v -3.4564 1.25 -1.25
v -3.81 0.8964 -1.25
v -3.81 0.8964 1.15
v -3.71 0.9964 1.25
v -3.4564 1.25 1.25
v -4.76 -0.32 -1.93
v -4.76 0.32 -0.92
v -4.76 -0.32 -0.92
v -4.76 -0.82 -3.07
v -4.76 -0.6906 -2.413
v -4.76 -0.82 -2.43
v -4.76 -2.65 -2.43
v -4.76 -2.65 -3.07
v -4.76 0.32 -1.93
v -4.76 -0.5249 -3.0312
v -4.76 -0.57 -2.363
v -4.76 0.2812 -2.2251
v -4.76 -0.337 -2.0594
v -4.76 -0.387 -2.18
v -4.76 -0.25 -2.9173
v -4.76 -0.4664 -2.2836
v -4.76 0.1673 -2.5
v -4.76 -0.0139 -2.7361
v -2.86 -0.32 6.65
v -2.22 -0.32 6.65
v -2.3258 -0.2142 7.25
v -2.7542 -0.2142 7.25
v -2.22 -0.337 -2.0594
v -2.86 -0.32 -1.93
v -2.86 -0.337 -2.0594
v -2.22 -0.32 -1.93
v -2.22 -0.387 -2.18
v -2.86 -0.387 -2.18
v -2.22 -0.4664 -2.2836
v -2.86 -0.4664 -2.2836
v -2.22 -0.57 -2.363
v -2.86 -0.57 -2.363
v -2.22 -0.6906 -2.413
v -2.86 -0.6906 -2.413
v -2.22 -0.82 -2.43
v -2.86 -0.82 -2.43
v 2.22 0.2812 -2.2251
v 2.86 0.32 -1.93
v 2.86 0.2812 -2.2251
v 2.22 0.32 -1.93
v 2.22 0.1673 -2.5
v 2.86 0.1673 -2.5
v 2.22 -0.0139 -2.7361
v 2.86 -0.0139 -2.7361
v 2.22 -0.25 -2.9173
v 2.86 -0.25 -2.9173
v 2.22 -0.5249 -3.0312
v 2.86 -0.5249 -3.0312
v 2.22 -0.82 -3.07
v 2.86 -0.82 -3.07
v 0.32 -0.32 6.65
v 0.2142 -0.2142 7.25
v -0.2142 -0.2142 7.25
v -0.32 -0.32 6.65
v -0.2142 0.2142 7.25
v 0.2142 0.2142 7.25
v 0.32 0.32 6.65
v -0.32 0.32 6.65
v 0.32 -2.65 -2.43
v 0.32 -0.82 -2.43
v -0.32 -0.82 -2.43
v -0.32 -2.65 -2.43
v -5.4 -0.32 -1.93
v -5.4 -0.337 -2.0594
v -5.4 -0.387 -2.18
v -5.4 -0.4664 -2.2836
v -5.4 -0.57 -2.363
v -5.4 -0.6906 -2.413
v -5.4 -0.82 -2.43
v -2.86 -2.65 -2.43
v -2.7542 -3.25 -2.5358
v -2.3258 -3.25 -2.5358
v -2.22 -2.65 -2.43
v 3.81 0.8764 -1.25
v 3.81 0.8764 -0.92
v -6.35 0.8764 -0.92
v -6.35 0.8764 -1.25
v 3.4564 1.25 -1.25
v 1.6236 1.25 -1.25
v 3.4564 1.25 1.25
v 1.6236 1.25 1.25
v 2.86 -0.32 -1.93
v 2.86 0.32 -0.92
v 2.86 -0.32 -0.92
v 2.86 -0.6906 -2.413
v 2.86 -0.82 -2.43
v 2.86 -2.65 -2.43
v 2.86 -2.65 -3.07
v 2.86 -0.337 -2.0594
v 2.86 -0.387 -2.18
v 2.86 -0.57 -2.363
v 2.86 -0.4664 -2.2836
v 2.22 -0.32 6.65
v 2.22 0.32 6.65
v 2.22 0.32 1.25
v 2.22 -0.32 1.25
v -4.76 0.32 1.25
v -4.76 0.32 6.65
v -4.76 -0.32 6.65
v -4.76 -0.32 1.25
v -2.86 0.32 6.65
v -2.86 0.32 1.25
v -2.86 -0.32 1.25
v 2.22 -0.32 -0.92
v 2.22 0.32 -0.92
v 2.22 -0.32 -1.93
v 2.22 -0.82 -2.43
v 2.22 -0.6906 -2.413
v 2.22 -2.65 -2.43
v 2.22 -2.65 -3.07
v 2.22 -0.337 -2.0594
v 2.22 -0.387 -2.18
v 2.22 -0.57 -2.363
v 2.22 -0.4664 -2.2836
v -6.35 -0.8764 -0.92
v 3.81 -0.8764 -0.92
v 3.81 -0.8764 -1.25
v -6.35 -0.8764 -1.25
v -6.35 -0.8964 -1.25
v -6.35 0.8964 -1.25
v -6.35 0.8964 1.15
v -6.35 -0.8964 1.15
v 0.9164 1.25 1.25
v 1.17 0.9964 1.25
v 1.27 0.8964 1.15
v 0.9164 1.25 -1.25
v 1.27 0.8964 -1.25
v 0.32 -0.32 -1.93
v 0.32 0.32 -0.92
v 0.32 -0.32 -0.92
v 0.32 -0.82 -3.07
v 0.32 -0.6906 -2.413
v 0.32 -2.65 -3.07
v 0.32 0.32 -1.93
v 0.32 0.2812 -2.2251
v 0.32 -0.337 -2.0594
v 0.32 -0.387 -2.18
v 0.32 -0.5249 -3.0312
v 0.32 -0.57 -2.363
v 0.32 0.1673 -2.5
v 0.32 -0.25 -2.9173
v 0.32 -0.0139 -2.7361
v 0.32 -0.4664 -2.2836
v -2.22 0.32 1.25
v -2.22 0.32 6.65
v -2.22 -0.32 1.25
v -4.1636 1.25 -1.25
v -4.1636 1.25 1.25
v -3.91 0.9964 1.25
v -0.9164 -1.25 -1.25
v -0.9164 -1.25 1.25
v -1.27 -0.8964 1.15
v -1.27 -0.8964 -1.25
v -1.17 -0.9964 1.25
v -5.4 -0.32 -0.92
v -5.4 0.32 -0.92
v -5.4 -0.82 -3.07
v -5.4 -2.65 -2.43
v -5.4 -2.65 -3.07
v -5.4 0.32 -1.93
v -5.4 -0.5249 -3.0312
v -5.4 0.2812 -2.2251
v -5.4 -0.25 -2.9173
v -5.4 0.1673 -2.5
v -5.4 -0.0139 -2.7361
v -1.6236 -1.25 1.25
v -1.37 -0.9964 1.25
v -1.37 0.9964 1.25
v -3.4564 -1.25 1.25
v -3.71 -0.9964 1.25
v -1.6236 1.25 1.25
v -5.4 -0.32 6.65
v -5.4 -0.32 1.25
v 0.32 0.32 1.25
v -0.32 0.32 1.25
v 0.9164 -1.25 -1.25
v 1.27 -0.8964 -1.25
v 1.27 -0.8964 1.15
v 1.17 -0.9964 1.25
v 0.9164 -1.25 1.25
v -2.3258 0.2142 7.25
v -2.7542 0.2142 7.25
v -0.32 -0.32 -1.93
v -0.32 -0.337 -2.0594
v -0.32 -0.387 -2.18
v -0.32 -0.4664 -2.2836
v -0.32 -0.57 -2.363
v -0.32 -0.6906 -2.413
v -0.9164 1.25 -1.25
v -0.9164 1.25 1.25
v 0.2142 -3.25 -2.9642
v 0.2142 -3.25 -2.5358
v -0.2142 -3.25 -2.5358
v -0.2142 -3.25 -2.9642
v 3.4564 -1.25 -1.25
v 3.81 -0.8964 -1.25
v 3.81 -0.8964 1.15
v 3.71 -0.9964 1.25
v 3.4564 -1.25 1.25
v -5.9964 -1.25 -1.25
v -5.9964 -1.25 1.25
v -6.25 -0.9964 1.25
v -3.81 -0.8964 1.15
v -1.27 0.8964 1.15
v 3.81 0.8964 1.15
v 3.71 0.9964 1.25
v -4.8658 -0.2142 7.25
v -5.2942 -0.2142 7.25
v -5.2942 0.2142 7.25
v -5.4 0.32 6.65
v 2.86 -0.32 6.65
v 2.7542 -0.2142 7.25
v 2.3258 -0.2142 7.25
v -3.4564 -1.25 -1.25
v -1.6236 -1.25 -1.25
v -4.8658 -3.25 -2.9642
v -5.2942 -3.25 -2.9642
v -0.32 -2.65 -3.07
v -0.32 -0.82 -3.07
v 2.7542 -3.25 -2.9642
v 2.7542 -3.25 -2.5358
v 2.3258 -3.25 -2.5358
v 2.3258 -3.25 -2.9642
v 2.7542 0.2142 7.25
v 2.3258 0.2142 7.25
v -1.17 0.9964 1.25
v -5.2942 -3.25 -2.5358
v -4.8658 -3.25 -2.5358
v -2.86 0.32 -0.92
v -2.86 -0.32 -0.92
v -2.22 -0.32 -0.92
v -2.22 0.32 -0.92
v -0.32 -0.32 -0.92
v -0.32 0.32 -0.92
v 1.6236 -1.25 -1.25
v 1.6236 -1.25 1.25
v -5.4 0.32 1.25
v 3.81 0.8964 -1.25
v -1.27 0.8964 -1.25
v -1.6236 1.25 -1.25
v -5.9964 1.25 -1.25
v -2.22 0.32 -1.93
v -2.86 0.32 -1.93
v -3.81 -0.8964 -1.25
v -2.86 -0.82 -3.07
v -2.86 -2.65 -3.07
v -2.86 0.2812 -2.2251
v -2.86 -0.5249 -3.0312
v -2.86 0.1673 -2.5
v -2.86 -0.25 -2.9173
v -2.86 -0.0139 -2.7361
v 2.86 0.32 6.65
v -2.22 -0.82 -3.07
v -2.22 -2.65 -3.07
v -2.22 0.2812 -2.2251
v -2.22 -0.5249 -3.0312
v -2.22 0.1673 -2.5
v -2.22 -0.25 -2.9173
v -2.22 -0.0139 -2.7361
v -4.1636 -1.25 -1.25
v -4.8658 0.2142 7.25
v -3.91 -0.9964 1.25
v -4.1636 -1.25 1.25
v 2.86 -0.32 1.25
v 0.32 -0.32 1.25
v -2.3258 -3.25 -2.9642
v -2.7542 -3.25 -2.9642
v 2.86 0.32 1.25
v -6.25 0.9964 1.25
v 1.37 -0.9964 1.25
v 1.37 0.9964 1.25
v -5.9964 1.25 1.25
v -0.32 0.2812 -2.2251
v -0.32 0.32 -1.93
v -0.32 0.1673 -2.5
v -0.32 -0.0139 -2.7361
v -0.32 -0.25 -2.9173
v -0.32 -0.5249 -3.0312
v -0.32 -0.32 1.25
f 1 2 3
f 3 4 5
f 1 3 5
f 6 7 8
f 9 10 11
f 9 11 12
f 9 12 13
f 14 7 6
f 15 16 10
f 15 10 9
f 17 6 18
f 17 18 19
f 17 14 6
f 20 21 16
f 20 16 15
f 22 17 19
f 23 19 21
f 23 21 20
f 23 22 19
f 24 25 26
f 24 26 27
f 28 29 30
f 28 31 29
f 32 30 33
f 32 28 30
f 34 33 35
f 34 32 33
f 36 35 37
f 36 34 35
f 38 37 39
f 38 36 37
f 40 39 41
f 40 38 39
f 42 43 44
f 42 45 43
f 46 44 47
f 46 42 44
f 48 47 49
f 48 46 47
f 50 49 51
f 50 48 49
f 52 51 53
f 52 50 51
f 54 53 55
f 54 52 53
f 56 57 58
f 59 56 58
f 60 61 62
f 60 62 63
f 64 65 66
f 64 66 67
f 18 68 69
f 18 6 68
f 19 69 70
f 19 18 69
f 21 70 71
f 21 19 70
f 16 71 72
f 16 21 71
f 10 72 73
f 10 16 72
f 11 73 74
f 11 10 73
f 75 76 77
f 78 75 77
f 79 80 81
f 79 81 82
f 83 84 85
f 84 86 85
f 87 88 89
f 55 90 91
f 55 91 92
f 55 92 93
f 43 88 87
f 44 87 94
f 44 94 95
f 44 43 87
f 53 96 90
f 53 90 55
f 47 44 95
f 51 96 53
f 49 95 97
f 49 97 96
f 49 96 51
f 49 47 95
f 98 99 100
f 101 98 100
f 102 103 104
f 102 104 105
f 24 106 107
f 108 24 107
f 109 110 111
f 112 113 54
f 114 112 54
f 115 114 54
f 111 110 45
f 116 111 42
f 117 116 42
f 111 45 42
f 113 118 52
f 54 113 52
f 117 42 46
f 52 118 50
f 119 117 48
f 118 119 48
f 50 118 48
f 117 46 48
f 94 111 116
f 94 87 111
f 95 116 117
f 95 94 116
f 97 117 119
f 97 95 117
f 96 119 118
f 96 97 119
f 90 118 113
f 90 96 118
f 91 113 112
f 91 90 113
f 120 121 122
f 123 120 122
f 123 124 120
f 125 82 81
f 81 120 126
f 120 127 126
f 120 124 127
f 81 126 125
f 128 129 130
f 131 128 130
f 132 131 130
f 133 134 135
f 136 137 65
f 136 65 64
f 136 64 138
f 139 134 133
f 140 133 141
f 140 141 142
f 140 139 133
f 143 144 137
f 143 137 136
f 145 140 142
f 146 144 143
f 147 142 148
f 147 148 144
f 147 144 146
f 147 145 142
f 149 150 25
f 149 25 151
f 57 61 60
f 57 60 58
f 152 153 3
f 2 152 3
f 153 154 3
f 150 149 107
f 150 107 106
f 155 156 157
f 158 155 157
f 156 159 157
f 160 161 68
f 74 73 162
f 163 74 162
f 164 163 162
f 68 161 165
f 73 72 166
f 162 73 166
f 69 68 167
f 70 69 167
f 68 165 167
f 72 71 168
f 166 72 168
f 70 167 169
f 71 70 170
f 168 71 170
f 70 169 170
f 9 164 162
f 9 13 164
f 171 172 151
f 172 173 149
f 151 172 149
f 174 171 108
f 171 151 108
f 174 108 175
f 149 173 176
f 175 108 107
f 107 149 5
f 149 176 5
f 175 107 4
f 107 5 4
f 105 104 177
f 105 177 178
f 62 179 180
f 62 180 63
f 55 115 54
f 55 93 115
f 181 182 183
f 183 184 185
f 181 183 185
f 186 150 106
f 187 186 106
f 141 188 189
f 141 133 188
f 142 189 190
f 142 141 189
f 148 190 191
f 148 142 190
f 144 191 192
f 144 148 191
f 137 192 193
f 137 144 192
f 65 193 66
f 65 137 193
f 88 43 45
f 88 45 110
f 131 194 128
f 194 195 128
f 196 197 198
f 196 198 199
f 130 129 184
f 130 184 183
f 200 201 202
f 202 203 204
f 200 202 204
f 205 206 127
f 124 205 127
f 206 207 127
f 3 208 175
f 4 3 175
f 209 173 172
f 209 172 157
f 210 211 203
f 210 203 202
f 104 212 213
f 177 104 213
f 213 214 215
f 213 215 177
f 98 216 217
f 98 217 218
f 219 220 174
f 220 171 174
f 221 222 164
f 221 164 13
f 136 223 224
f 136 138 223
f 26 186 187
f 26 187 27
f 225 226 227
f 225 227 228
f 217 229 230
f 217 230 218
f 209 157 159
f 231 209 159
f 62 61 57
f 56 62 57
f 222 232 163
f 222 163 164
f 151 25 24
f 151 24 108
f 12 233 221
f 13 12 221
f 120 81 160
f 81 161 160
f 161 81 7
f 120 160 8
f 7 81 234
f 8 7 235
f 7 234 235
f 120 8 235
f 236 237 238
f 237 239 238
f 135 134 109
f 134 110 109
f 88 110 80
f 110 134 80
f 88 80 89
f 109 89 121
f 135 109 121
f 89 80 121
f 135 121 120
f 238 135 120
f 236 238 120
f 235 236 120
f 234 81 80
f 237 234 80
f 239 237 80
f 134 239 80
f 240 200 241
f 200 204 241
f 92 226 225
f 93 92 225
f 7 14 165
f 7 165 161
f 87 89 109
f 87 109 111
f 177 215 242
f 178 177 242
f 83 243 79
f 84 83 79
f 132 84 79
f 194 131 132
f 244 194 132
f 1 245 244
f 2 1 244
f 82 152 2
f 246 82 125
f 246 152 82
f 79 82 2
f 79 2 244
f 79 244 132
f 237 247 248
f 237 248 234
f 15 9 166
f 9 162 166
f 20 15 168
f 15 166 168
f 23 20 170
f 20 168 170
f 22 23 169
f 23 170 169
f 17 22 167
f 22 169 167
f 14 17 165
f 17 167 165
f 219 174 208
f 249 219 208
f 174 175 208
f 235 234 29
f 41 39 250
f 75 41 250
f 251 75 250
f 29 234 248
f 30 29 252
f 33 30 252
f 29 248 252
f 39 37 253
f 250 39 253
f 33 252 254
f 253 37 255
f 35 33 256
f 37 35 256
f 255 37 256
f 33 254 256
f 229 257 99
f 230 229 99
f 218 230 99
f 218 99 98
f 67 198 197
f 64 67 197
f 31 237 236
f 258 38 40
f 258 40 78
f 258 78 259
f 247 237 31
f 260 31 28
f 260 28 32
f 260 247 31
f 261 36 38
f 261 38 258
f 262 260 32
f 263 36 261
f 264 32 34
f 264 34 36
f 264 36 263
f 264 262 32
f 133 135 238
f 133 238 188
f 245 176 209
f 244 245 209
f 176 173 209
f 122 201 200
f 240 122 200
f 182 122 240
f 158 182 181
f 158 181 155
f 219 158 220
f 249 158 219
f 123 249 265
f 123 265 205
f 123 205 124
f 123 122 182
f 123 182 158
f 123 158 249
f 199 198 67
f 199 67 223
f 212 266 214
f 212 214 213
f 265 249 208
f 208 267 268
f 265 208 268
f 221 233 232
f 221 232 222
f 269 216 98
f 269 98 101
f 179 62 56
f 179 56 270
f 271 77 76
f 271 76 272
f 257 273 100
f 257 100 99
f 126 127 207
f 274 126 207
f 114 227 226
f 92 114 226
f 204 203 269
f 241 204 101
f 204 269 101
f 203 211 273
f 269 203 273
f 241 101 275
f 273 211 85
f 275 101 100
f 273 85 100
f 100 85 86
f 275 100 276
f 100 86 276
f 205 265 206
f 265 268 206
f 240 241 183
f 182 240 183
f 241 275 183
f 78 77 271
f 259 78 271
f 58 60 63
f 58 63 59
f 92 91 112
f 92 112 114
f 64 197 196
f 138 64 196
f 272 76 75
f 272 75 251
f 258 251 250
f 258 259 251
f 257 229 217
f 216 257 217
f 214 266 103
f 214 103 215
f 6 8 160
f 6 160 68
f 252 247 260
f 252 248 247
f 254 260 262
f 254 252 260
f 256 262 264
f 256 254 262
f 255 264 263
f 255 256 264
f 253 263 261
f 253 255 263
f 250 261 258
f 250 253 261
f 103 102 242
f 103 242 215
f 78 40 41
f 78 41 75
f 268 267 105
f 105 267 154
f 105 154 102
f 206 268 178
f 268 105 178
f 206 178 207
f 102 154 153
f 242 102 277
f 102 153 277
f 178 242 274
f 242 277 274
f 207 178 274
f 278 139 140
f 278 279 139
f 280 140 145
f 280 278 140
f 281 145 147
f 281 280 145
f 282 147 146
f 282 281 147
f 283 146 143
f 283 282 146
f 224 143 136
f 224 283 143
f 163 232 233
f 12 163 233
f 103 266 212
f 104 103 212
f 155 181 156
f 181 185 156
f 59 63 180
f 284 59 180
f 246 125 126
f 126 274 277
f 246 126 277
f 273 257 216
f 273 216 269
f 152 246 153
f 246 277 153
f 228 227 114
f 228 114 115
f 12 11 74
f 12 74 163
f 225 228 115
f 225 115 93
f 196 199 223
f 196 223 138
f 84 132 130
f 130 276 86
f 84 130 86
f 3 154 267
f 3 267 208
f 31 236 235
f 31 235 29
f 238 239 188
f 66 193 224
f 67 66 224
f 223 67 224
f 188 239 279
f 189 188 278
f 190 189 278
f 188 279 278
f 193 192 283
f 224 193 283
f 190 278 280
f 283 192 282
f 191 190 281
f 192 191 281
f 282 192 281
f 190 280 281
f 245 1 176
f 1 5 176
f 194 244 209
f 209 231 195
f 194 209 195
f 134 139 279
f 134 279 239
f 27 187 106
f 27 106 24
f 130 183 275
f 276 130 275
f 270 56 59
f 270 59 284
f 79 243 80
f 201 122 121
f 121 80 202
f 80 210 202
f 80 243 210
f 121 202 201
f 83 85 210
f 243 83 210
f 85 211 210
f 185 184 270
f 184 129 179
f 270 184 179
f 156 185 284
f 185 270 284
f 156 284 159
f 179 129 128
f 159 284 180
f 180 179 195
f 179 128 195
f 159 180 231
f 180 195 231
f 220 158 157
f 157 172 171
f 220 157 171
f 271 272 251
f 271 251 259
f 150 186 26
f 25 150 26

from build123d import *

# Parameters (mm, degrees)
EXTRUDE1_DEPTH          = 1.25
CUT_EXTRUDE3_DEPTH      = 2.25
LPATTERN4_COUNT         = 3
LPATTERN4_PITCH         = 2.54
LPATTERN4_COUNT_DIR2    = 2
LPATTERN4_PITCH_DIR2    = 2.54
SKETCH2_W               = 1.752893218
SKETCH2_H               = 0.33
CUT_EXTRUDE1_DEPTH      = 4.81
CUT_EXTRUDE1_DEPTH_BACK = 7.35
EXTRUDE_THIN1_DEPTH     = 0.32
LPATTERN5_COUNT         = 2
LPATTERN5_PITCH         = 2.54
LPATTERN5_COL_COUNT     = 3
LPATTERN5_COL_PITCH     = 2.54
CHAMFER2_SIZE           = 0.6
CHAMFER2_SIZE2          = 0.105796188
CHAMFER2_PART_2_SIZE    = 0.6
CHAMFER2_PART_2_SIZE2   = 0.105796188
CHAMFER2_PART_3_SIZE    = 0.6
CHAMFER2_PART_3_SIZE2   = 0.105796188
CHAMFER2_PART_4_SIZE    = 0.6
CHAMFER2_PART_4_SIZE2   = 0.105796188
CHAMFER2_PART_5_SIZE    = 0.6
CHAMFER2_PART_5_SIZE2   = 0.105796188
CHAMFER2_PART_6_SIZE    = 0.6
CHAMFER2_PART_6_SIZE2   = 0.105796188
CHAMFER2_PART_7_SIZE    = 0.6
CHAMFER2_PART_7_SIZE2   = 0.105796188
CHAMFER2_PART_8_SIZE    = 0.6
CHAMFER2_PART_8_SIZE2   = 0.105796188
CHAMFER2_PART_9_SIZE    = 0.6
CHAMFER2_PART_9_SIZE2   = 0.105796188
CHAMFER2_PART_10_SIZE   = 0.6
CHAMFER2_PART_10_SIZE2  = 0.105796188
CHAMFER2_PART_11_SIZE   = 0.6
CHAMFER2_PART_11_SIZE2  = 0.105796188
CHAMFER2_PART_12_SIZE   = 0.6
CHAMFER2_PART_12_SIZE2  = 0.105796188
CHAMFER2_PART_13_SIZE   = 0.6
CHAMFER2_PART_13_SIZE2  = 0.105796188
CHAMFER2_PART_14_SIZE   = 0.6
CHAMFER2_PART_14_SIZE2  = 0.105796188
CHAMFER2_PART_15_SIZE   = 0.6
CHAMFER2_PART_15_SIZE2  = 0.105796188
CHAMFER2_PART_16_SIZE   = 0.6
CHAMFER2_PART_16_SIZE2  = 0.105796188
CHAMFER2_PART_17_SIZE   = 0.6
CHAMFER2_PART_17_SIZE2  = 0.105796188
CHAMFER2_PART_18_SIZE   = 0.6
CHAMFER2_PART_18_SIZE2  = 0.105796188
CHAMFER2_PART_19_SIZE   = 0.6
CHAMFER2_PART_19_SIZE2  = 0.105796188
CHAMFER2_PART_20_SIZE   = 0.6
CHAMFER2_PART_20_SIZE2  = 0.105796188
CHAMFER2_PART_21_SIZE   = 0.6
CHAMFER2_PART_21_SIZE2  = 0.105796188
CHAMFER2_PART_22_SIZE   = 0.6
CHAMFER2_PART_22_SIZE2  = 0.105796188
CHAMFER2_PART_23_SIZE   = 0.6
CHAMFER2_PART_23_SIZE2  = 0.105796188
CHAMFER2_PART_24_SIZE   = 0.6
CHAMFER2_PART_24_SIZE2  = 0.105796188
CHAMFER2_PART_25_SIZE   = 0.6
CHAMFER2_PART_25_SIZE2  = 0.105796188
CHAMFER2_PART_26_SIZE   = 0.6
CHAMFER2_PART_26_SIZE2  = 0.105796188
CHAMFER2_PART_27_SIZE   = 0.6
CHAMFER2_PART_27_SIZE2  = 0.105796188
CHAMFER2_PART_28_SIZE   = 0.6
CHAMFER2_PART_28_SIZE2  = 0.105796188
CHAMFER2_PART_29_SIZE   = 0.6
CHAMFER2_PART_29_SIZE2  = 0.105796188
CHAMFER2_PART_30_SIZE   = 0.6
CHAMFER2_PART_30_SIZE2  = 0.105796188
CHAMFER2_PART_31_SIZE   = 0.6
CHAMFER2_PART_31_SIZE2  = 0.105796188
CHAMFER2_PART_32_SIZE   = 0.6
CHAMFER2_PART_32_SIZE2  = 0.105796188
FILLET1_R               = 0.5
FILLET2_R               = 1.14


with BuildPart() as part:
    # Sketch1 → Extrude1 (new body, symmetric)
    with BuildSketch(Plane.XY):
        Polygon((-1.27, 0.896446609), (-0.916446609, 1.25), (0.916446609, 1.25), (1.27, 0.896446609), (1.27, -0.896446609), (0.916446609, -1.25), (-0.916446609, -1.25), (-1.27, -0.896446609), align=None)
    extrude1 = extrude(amount=EXTRUDE1_DEPTH, both=True)

    # Sketch4 → Cut-Extrude3 (cut, symmetric)
    with BuildSketch(Plane(origin=(0, 0, 0), x_dir=(1, 0, 0), z_dir=(0, 1, 0))):
        Polygon((-1.27, -1.15), (-1.17, -1.25), (-1.27, -1.25), align=None)
        Polygon((1.17, -1.25), (1.27, -1.15), (1.27, -1.25), align=None)
    cut_extrude3 = extrude(amount=CUT_EXTRUDE3_DEPTH, both=True, mode=Mode.SUBTRACT)

    # LPattern4: Extrude1, Cut-Extrude3 3 × 2
    with Locations(*[Vector(-1, 0, 0) * (i * LPATTERN4_PITCH) + Vector(1, 0, 0) * (j * LPATTERN4_PITCH_DIR2) for i in range(LPATTERN4_COUNT) for j in range(LPATTERN4_COUNT_DIR2) if (i, j) != (0, 0)]):
        add(extrude1)
        add(cut_extrude3, mode=Mode.SUBTRACT)

    # Sketch2 → Cut-Extrude1 (cut, two sides)
    with BuildSketch(Plane(origin=(0, 0, 0), x_dir=(0, -1, 0), z_dir=(1, 0, 0))) as cut_extrude1_sk:
        with Locations((0, 1.085)):
            Rectangle(SKETCH2_W, SKETCH2_H)
    extrude(amount=CUT_EXTRUDE1_DEPTH, mode=Mode.SUBTRACT)
    extrude(cut_extrude1_sk.sketch, amount=-CUT_EXTRUDE1_DEPTH_BACK, mode=Mode.SUBTRACT)

    # Sketch3 → Extrude-Thin1 (add, symmetric)
    with BuildSketch(Plane(origin=(0, 0, 0), x_dir=(0, 0, -1), z_dir=(1, 0, 0))):
        Polygon((-7.25, -0.32), (2.43, -0.32), (2.43, -3.25), (3.07, -3.25), (3.07, 0.32), (-7.25, 0.32), align=None)
    extrude_thin1 = extrude(amount=EXTRUDE_THIN1_DEPTH, both=True)

    # LPattern5: Extrude-Thin1 ×2
    with Locations(*[(i * LPATTERN5_PITCH, 0, 0) for i in range(1, LPATTERN5_COUNT)]):
        add(extrude_thin1)

    # LPattern5 col: Extrude-Thin1 ×3
    with Locations(*[(-i * LPATTERN5_COL_PITCH, 0, 0) for i in range(1, LPATTERN5_COL_COUNT)]):
        add(extrude_thin1)

    # Chamfer2
    chamfer2_edges = [part.edges().sort_by_distance(p)[0] for p in [
        (0, -0.32, 7.25),
    ]]
    chamfer2_side = [part.faces().sort_by_distance(p)[0] for p in [
        (0, -0.32, 4.25),
    ]]
    chamfer(chamfer2_edges, length=CHAMFER2_SIZE, length2=CHAMFER2_SIZE2, reference=chamfer2_side[0])

    # Chamfer2 part 2
    chamfer2_part_2_edges = [part.edges().sort_by_distance(p)[0] for p in [
        (-0.32, 0, 7.25),
    ]]
    chamfer2_part_2_side = [part.faces().sort_by_distance(p)[0] for p in [
        (-0.32, 0, 4.25),
    ]]
    chamfer(chamfer2_part_2_edges, length=CHAMFER2_PART_2_SIZE, length2=CHAMFER2_PART_2_SIZE2, reference=chamfer2_part_2_side[0])

    # Chamfer2 part 3
    chamfer2_part_3_edges = [part.edges().sort_by_distance(p)[0] for p in [
        (-0.32, -3.25, -2.75),
    ]]
    chamfer2_part_3_side = [part.faces().sort_by_distance(p)[0] for p in [
        (-0.32, -1.029537402, -2.430462598),
    ]]
    chamfer(chamfer2_part_3_edges, length=CHAMFER2_PART_3_SIZE, length2=CHAMFER2_PART_3_SIZE2, reference=chamfer2_part_3_side[0])

    # Chamfer2 part 4
    chamfer2_part_4_edges = [part.edges().sort_by_distance(p)[0] for p in [
        (0, -3.25, -2.43),
    ]]
    chamfer2_part_4_side = [part.faces().sort_by_distance(p)[0] for p in [
        (0, -1.785, -2.43),
    ]]
    chamfer(chamfer2_part_4_edges, length=CHAMFER2_PART_4_SIZE, length2=CHAMFER2_PART_4_SIZE2, reference=chamfer2_part_4_side[0])

    # Chamfer2 part 5
    chamfer2_part_5_edges = [part.edges().sort_by_distance(p)[0] for p in [
        (0.32, -3.25, -2.75),
    ]]
    chamfer2_part_5_side = [part.faces().sort_by_distance(p)[0] for p in [
        (0.32, -1.029537402, -2.430462598),
    ]]
    chamfer(chamfer2_part_5_edges, length=CHAMFER2_PART_5_SIZE, length2=CHAMFER2_PART_5_SIZE2, reference=chamfer2_part_5_side[0])

    # Chamfer2 part 6
    chamfer2_part_6_edges = [part.edges().sort_by_distance(p)[0] for p in [
        (0, -3.25, -3.07),
    ]]
    chamfer2_part_6_side = [part.faces().sort_by_distance(p)[0] for p in [
        (0, -1.465, -3.07),
    ]]
    chamfer(chamfer2_part_6_edges, length=CHAMFER2_PART_6_SIZE, length2=CHAMFER2_PART_6_SIZE2, reference=chamfer2_part_6_side[0])

    # Chamfer2 part 7
    chamfer2_part_7_edges = [part.edges().sort_by_distance(p)[0] for p in [
        (0, 0.32, 7.25),
    ]]
    chamfer2_part_7_side = [part.faces().sort_by_distance(p)[0] for p in [
        (0, 0.32, 4.25),
    ]]
    chamfer(chamfer2_part_7_edges, length=CHAMFER2_PART_7_SIZE, length2=CHAMFER2_PART_7_SIZE2, reference=chamfer2_part_7_side[0])

    # Chamfer2 part 8
    chamfer2_part_8_edges = [part.edges().sort_by_distance(p)[0] for p in [
        (0.32, 0, 7.25),
    ]]
    chamfer2_part_8_side = [part.faces().sort_by_distance(p)[0] for p in [
        (0.32, 0, 4.25),
    ]]
    chamfer(chamfer2_part_8_edges, length=CHAMFER2_PART_8_SIZE, length2=CHAMFER2_PART_8_SIZE2, reference=chamfer2_part_8_side[0])

    # Chamfer2 part 9
    chamfer2_part_9_edges = [part.edges().sort_by_distance(p)[0] for p in [
        (-2.54, -0.32, 7.25),
    ]]
    chamfer2_part_9_side = [part.faces().sort_by_distance(p)[0] for p in [
        (-2.54, -0.32, 4.25),
    ]]
    chamfer(chamfer2_part_9_edges, length=CHAMFER2_PART_9_SIZE, length2=CHAMFER2_PART_9_SIZE2, reference=chamfer2_part_9_side[0])

    # Chamfer2 part 10
    chamfer2_part_10_edges = [part.edges().sort_by_distance(p)[0] for p in [
        (-2.86, 0, 7.25),
    ]]
    chamfer2_part_10_side = [part.faces().sort_by_distance(p)[0] for p in [
        (-2.86, 0, 4.25),
    ]]
    chamfer(chamfer2_part_10_edges, length=CHAMFER2_PART_10_SIZE, length2=CHAMFER2_PART_10_SIZE2, reference=chamfer2_part_10_side[0])

    # Chamfer2 part 11
    chamfer2_part_11_edges = [part.edges().sort_by_distance(p)[0] for p in [
        (-2.86, -3.25, -2.75),
    ]]
    chamfer2_part_11_side = [part.faces().sort_by_distance(p)[0] for p in [
        (-2.86, -1.029537402, -2.430462598),
    ]]
    chamfer(chamfer2_part_11_edges, length=CHAMFER2_PART_11_SIZE, length2=CHAMFER2_PART_11_SIZE2, reference=chamfer2_part_11_side[0])

    # Chamfer2 part 12
    chamfer2_part_12_edges = [part.edges().sort_by_distance(p)[0] for p in [
        (-2.54, -3.25, -2.43),
    ]]
    chamfer2_part_12_side = [part.faces().sort_by_distance(p)[0] for p in [
        (-2.54, -1.785, -2.43),
    ]]
    chamfer(chamfer2_part_12_edges, length=CHAMFER2_PART_12_SIZE, length2=CHAMFER2_PART_12_SIZE2, reference=chamfer2_part_12_side[0])

    # Chamfer2 part 13
    chamfer2_part_13_edges = [part.edges().sort_by_distance(p)[0] for p in [
        (-2.22, -3.25, -2.75),
    ]]
    chamfer2_part_13_side = [part.faces().sort_by_distance(p)[0] for p in [
        (-2.22, -1.029537402, -2.430462598),
    ]]
    chamfer(chamfer2_part_13_edges, length=CHAMFER2_PART_13_SIZE, length2=CHAMFER2_PART_13_SIZE2, reference=chamfer2_part_13_side[0])

    # Chamfer2 part 14
    chamfer2_part_14_edges = [part.edges().sort_by_distance(p)[0] for p in [
        (-2.54, -3.25, -3.07),
    ]]
    chamfer2_part_14_side = [part.faces().sort_by_distance(p)[0] for p in [
        (-2.54, -1.465, -3.07),
    ]]
    chamfer(chamfer2_part_14_edges, length=CHAMFER2_PART_14_SIZE, length2=CHAMFER2_PART_14_SIZE2, reference=chamfer2_part_14_side[0])

    # Chamfer2 part 15
    chamfer2_part_15_edges = [part.edges().sort_by_distance(p)[0] for p in [
        (-2.54, 0.32, 7.25),
    ]]
    chamfer2_part_15_side = [part.faces().sort_by_distance(p)[0] for p in [
        (-2.54, 0.32, 4.25),
    ]]
    chamfer(chamfer2_part_15_edges, length=CHAMFER2_PART_15_SIZE, length2=CHAMFER2_PART_15_SIZE2, reference=chamfer2_part_15_side[0])

    # Chamfer2 part 16
    chamfer2_part_16_edges = [part.edges().sort_by_distance(p)[0] for p in [
        (-2.22, 0, 7.25),
    ]]
    chamfer2_part_16_side = [part.faces().sort_by_distance(p)[0] for p in [
        (-2.22, 0, 4.25),
    ]]
    chamfer(chamfer2_part_16_edges, length=CHAMFER2_PART_16_SIZE, length2=CHAMFER2_PART_16_SIZE2, reference=chamfer2_part_16_side[0])

    # Chamfer2 part 17
    chamfer2_part_17_edges = [part.edges().sort_by_distance(p)[0] for p in [
        (-5.08, -0.32, 7.25),
    ]]
    chamfer2_part_17_side = [part.faces().sort_by_distance(p)[0] for p in [
        (-5.08, -0.32, 4.25),
    ]]
    chamfer(chamfer2_part_17_edges, length=CHAMFER2_PART_17_SIZE, length2=CHAMFER2_PART_17_SIZE2, reference=chamfer2_part_17_side[0])

    # Chamfer2 part 18
    chamfer2_part_18_edges = [part.edges().sort_by_distance(p)[0] for p in [
        (-5.4, 0, 7.25),
    ]]
    chamfer2_part_18_side = [part.faces().sort_by_distance(p)[0] for p in [
        (-5.4, 0, 4.25),
    ]]
    chamfer(chamfer2_part_18_edges, length=CHAMFER2_PART_18_SIZE, length2=CHAMFER2_PART_18_SIZE2, reference=chamfer2_part_18_side[0])

    # Chamfer2 part 19
    chamfer2_part_19_edges = [part.edges().sort_by_distance(p)[0] for p in [
        (-5.4, -3.25, -2.75),
    ]]
    chamfer2_part_19_side = [part.faces().sort_by_distance(p)[0] for p in [
        (-5.4, -1.029537402, -2.430462598),
    ]]
    chamfer(chamfer2_part_19_edges, length=CHAMFER2_PART_19_SIZE, length2=CHAMFER2_PART_19_SIZE2, reference=chamfer2_part_19_side[0])

    # Chamfer2 part 20
    chamfer2_part_20_edges = [part.edges().sort_by_distance(p)[0] for p in [
        (-5.08, -3.25, -2.43),
    ]]
    chamfer2_part_20_side = [part.faces().sort_by_distance(p)[0] for p in [
        (-5.08, -1.785, -2.43),
    ]]
    chamfer(chamfer2_part_20_edges, length=CHAMFER2_PART_20_SIZE, length2=CHAMFER2_PART_20_SIZE2, reference=chamfer2_part_20_side[0])

    # Chamfer2 part 21
    chamfer2_part_21_edges = [part.edges().sort_by_distance(p)[0] for p in [
        (-4.76, -3.25, -2.75),
    ]]
    chamfer2_part_21_side = [part.faces().sort_by_distance(p)[0] for p in [
        (-4.76, -1.029537402, -2.430462598),
    ]]
    chamfer(chamfer2_part_21_edges, length=CHAMFER2_PART_21_SIZE, length2=CHAMFER2_PART_21_SIZE2, reference=chamfer2_part_21_side[0])

    # Chamfer2 part 22
    chamfer2_part_22_edges = [part.edges().sort_by_distance(p)[0] for p in [
        (-5.08, -3.25, -3.07),
    ]]
    chamfer2_part_22_side = [part.faces().sort_by_distance(p)[0] for p in [
        (-5.08, -1.465, -3.07),
    ]]
    chamfer(chamfer2_part_22_edges, length=CHAMFER2_PART_22_SIZE, length2=CHAMFER2_PART_22_SIZE2, reference=chamfer2_part_22_side[0])

    # Chamfer2 part 23
    chamfer2_part_23_edges = [part.edges().sort_by_distance(p)[0] for p in [
        (-5.08, 0.32, 7.25),
    ]]
    chamfer2_part_23_side = [part.faces().sort_by_distance(p)[0] for p in [
        (-5.08, 0.32, 4.25),
    ]]
    chamfer(chamfer2_part_23_edges, length=CHAMFER2_PART_23_SIZE, length2=CHAMFER2_PART_23_SIZE2, reference=chamfer2_part_23_side[0])

    # Chamfer2 part 24
    chamfer2_part_24_edges = [part.edges().sort_by_distance(p)[0] for p in [
        (-4.76, 0, 7.25),
    ]]
    chamfer2_part_24_side = [part.faces().sort_by_distance(p)[0] for p in [
        (-4.76, 0, 4.25),
    ]]
    chamfer(chamfer2_part_24_edges, length=CHAMFER2_PART_24_SIZE, length2=CHAMFER2_PART_24_SIZE2, reference=chamfer2_part_24_side[0])

    # Chamfer2 part 25
    chamfer2_part_25_edges = [part.edges().sort_by_distance(p)[0] for p in [
        (2.54, -0.32, 7.25),
    ]]
    chamfer2_part_25_side = [part.faces().sort_by_distance(p)[0] for p in [
        (2.54, -0.32, 4.25),
    ]]
    chamfer(chamfer2_part_25_edges, length=CHAMFER2_PART_25_SIZE, length2=CHAMFER2_PART_25_SIZE2, reference=chamfer2_part_25_side[0])

    # Chamfer2 part 26
    chamfer2_part_26_edges = [part.edges().sort_by_distance(p)[0] for p in [
        (2.22, 0, 7.25),
    ]]
    chamfer2_part_26_side = [part.faces().sort_by_distance(p)[0] for p in [
        (2.22, 0, 4.25),
    ]]
    chamfer(chamfer2_part_26_edges, length=CHAMFER2_PART_26_SIZE, length2=CHAMFER2_PART_26_SIZE2, reference=chamfer2_part_26_side[0])

    # Chamfer2 part 27
    chamfer2_part_27_edges = [part.edges().sort_by_distance(p)[0] for p in [
        (2.22, -3.25, -2.75),
    ]]
    chamfer2_part_27_side = [part.faces().sort_by_distance(p)[0] for p in [
        (2.22, -1.029537402, -2.430462598),
    ]]
    chamfer(chamfer2_part_27_edges, length=CHAMFER2_PART_27_SIZE, length2=CHAMFER2_PART_27_SIZE2, reference=chamfer2_part_27_side[0])

    # Chamfer2 part 28
    chamfer2_part_28_edges = [part.edges().sort_by_distance(p)[0] for p in [
        (2.54, -3.25, -2.43),
    ]]
    chamfer2_part_28_side = [part.faces().sort_by_distance(p)[0] for p in [
        (2.54, -1.785, -2.43),
    ]]
    chamfer(chamfer2_part_28_edges, length=CHAMFER2_PART_28_SIZE, length2=CHAMFER2_PART_28_SIZE2, reference=chamfer2_part_28_side[0])

    # Chamfer2 part 29
    chamfer2_part_29_edges = [part.edges().sort_by_distance(p)[0] for p in [
        (2.86, -3.25, -2.75),
    ]]
    chamfer2_part_29_side = [part.faces().sort_by_distance(p)[0] for p in [
        (2.86, -1.029537402, -2.430462598),
    ]]
    chamfer(chamfer2_part_29_edges, length=CHAMFER2_PART_29_SIZE, length2=CHAMFER2_PART_29_SIZE2, reference=chamfer2_part_29_side[0])

    # Chamfer2 part 30
    chamfer2_part_30_edges = [part.edges().sort_by_distance(p)[0] for p in [
        (2.54, -3.25, -3.07),
    ]]
    chamfer2_part_30_side = [part.faces().sort_by_distance(p)[0] for p in [
        (2.54, -1.465, -3.07),
    ]]
    chamfer(chamfer2_part_30_edges, length=CHAMFER2_PART_30_SIZE, length2=CHAMFER2_PART_30_SIZE2, reference=chamfer2_part_30_side[0])

    # Chamfer2 part 31
    chamfer2_part_31_edges = [part.edges().sort_by_distance(p)[0] for p in [
        (2.54, 0.32, 7.25),
    ]]
    chamfer2_part_31_side = [part.faces().sort_by_distance(p)[0] for p in [
        (2.54, 0.32, 4.25),
    ]]
    chamfer(chamfer2_part_31_edges, length=CHAMFER2_PART_31_SIZE, length2=CHAMFER2_PART_31_SIZE2, reference=chamfer2_part_31_side[0])

    # Chamfer2 part 32
    chamfer2_part_32_edges = [part.edges().sort_by_distance(p)[0] for p in [
        (2.86, 0, 7.25),
    ]]
    chamfer2_part_32_side = [part.faces().sort_by_distance(p)[0] for p in [
        (2.86, 0, 4.25),
    ]]
    chamfer(chamfer2_part_32_edges, length=CHAMFER2_PART_32_SIZE, length2=CHAMFER2_PART_32_SIZE2, reference=chamfer2_part_32_side[0])

    # Fillet1
    fillet1_edges = [part.edges().sort_by_distance(p)[0] for p in [
        (0, -0.32, -2.43),
        (-2.54, -0.32, -2.43),
        (-5.08, -0.32, -2.43),
        (2.54, -0.32, -2.43),
    ]]
    fillet(fillet1_edges, radius=FILLET1_R)

    # Fillet2
    fillet2_edges = [part.edges().sort_by_distance(p)[0] for p in [
        (0, 0.32, -3.07),
        (-2.54, 0.32, -3.07),
        (-5.08, 0.32, -3.07),
        (2.54, 0.32, -3.07),
    ]]
    fillet(fillet2_edges, radius=FILLET2_R)


solid = part.part
